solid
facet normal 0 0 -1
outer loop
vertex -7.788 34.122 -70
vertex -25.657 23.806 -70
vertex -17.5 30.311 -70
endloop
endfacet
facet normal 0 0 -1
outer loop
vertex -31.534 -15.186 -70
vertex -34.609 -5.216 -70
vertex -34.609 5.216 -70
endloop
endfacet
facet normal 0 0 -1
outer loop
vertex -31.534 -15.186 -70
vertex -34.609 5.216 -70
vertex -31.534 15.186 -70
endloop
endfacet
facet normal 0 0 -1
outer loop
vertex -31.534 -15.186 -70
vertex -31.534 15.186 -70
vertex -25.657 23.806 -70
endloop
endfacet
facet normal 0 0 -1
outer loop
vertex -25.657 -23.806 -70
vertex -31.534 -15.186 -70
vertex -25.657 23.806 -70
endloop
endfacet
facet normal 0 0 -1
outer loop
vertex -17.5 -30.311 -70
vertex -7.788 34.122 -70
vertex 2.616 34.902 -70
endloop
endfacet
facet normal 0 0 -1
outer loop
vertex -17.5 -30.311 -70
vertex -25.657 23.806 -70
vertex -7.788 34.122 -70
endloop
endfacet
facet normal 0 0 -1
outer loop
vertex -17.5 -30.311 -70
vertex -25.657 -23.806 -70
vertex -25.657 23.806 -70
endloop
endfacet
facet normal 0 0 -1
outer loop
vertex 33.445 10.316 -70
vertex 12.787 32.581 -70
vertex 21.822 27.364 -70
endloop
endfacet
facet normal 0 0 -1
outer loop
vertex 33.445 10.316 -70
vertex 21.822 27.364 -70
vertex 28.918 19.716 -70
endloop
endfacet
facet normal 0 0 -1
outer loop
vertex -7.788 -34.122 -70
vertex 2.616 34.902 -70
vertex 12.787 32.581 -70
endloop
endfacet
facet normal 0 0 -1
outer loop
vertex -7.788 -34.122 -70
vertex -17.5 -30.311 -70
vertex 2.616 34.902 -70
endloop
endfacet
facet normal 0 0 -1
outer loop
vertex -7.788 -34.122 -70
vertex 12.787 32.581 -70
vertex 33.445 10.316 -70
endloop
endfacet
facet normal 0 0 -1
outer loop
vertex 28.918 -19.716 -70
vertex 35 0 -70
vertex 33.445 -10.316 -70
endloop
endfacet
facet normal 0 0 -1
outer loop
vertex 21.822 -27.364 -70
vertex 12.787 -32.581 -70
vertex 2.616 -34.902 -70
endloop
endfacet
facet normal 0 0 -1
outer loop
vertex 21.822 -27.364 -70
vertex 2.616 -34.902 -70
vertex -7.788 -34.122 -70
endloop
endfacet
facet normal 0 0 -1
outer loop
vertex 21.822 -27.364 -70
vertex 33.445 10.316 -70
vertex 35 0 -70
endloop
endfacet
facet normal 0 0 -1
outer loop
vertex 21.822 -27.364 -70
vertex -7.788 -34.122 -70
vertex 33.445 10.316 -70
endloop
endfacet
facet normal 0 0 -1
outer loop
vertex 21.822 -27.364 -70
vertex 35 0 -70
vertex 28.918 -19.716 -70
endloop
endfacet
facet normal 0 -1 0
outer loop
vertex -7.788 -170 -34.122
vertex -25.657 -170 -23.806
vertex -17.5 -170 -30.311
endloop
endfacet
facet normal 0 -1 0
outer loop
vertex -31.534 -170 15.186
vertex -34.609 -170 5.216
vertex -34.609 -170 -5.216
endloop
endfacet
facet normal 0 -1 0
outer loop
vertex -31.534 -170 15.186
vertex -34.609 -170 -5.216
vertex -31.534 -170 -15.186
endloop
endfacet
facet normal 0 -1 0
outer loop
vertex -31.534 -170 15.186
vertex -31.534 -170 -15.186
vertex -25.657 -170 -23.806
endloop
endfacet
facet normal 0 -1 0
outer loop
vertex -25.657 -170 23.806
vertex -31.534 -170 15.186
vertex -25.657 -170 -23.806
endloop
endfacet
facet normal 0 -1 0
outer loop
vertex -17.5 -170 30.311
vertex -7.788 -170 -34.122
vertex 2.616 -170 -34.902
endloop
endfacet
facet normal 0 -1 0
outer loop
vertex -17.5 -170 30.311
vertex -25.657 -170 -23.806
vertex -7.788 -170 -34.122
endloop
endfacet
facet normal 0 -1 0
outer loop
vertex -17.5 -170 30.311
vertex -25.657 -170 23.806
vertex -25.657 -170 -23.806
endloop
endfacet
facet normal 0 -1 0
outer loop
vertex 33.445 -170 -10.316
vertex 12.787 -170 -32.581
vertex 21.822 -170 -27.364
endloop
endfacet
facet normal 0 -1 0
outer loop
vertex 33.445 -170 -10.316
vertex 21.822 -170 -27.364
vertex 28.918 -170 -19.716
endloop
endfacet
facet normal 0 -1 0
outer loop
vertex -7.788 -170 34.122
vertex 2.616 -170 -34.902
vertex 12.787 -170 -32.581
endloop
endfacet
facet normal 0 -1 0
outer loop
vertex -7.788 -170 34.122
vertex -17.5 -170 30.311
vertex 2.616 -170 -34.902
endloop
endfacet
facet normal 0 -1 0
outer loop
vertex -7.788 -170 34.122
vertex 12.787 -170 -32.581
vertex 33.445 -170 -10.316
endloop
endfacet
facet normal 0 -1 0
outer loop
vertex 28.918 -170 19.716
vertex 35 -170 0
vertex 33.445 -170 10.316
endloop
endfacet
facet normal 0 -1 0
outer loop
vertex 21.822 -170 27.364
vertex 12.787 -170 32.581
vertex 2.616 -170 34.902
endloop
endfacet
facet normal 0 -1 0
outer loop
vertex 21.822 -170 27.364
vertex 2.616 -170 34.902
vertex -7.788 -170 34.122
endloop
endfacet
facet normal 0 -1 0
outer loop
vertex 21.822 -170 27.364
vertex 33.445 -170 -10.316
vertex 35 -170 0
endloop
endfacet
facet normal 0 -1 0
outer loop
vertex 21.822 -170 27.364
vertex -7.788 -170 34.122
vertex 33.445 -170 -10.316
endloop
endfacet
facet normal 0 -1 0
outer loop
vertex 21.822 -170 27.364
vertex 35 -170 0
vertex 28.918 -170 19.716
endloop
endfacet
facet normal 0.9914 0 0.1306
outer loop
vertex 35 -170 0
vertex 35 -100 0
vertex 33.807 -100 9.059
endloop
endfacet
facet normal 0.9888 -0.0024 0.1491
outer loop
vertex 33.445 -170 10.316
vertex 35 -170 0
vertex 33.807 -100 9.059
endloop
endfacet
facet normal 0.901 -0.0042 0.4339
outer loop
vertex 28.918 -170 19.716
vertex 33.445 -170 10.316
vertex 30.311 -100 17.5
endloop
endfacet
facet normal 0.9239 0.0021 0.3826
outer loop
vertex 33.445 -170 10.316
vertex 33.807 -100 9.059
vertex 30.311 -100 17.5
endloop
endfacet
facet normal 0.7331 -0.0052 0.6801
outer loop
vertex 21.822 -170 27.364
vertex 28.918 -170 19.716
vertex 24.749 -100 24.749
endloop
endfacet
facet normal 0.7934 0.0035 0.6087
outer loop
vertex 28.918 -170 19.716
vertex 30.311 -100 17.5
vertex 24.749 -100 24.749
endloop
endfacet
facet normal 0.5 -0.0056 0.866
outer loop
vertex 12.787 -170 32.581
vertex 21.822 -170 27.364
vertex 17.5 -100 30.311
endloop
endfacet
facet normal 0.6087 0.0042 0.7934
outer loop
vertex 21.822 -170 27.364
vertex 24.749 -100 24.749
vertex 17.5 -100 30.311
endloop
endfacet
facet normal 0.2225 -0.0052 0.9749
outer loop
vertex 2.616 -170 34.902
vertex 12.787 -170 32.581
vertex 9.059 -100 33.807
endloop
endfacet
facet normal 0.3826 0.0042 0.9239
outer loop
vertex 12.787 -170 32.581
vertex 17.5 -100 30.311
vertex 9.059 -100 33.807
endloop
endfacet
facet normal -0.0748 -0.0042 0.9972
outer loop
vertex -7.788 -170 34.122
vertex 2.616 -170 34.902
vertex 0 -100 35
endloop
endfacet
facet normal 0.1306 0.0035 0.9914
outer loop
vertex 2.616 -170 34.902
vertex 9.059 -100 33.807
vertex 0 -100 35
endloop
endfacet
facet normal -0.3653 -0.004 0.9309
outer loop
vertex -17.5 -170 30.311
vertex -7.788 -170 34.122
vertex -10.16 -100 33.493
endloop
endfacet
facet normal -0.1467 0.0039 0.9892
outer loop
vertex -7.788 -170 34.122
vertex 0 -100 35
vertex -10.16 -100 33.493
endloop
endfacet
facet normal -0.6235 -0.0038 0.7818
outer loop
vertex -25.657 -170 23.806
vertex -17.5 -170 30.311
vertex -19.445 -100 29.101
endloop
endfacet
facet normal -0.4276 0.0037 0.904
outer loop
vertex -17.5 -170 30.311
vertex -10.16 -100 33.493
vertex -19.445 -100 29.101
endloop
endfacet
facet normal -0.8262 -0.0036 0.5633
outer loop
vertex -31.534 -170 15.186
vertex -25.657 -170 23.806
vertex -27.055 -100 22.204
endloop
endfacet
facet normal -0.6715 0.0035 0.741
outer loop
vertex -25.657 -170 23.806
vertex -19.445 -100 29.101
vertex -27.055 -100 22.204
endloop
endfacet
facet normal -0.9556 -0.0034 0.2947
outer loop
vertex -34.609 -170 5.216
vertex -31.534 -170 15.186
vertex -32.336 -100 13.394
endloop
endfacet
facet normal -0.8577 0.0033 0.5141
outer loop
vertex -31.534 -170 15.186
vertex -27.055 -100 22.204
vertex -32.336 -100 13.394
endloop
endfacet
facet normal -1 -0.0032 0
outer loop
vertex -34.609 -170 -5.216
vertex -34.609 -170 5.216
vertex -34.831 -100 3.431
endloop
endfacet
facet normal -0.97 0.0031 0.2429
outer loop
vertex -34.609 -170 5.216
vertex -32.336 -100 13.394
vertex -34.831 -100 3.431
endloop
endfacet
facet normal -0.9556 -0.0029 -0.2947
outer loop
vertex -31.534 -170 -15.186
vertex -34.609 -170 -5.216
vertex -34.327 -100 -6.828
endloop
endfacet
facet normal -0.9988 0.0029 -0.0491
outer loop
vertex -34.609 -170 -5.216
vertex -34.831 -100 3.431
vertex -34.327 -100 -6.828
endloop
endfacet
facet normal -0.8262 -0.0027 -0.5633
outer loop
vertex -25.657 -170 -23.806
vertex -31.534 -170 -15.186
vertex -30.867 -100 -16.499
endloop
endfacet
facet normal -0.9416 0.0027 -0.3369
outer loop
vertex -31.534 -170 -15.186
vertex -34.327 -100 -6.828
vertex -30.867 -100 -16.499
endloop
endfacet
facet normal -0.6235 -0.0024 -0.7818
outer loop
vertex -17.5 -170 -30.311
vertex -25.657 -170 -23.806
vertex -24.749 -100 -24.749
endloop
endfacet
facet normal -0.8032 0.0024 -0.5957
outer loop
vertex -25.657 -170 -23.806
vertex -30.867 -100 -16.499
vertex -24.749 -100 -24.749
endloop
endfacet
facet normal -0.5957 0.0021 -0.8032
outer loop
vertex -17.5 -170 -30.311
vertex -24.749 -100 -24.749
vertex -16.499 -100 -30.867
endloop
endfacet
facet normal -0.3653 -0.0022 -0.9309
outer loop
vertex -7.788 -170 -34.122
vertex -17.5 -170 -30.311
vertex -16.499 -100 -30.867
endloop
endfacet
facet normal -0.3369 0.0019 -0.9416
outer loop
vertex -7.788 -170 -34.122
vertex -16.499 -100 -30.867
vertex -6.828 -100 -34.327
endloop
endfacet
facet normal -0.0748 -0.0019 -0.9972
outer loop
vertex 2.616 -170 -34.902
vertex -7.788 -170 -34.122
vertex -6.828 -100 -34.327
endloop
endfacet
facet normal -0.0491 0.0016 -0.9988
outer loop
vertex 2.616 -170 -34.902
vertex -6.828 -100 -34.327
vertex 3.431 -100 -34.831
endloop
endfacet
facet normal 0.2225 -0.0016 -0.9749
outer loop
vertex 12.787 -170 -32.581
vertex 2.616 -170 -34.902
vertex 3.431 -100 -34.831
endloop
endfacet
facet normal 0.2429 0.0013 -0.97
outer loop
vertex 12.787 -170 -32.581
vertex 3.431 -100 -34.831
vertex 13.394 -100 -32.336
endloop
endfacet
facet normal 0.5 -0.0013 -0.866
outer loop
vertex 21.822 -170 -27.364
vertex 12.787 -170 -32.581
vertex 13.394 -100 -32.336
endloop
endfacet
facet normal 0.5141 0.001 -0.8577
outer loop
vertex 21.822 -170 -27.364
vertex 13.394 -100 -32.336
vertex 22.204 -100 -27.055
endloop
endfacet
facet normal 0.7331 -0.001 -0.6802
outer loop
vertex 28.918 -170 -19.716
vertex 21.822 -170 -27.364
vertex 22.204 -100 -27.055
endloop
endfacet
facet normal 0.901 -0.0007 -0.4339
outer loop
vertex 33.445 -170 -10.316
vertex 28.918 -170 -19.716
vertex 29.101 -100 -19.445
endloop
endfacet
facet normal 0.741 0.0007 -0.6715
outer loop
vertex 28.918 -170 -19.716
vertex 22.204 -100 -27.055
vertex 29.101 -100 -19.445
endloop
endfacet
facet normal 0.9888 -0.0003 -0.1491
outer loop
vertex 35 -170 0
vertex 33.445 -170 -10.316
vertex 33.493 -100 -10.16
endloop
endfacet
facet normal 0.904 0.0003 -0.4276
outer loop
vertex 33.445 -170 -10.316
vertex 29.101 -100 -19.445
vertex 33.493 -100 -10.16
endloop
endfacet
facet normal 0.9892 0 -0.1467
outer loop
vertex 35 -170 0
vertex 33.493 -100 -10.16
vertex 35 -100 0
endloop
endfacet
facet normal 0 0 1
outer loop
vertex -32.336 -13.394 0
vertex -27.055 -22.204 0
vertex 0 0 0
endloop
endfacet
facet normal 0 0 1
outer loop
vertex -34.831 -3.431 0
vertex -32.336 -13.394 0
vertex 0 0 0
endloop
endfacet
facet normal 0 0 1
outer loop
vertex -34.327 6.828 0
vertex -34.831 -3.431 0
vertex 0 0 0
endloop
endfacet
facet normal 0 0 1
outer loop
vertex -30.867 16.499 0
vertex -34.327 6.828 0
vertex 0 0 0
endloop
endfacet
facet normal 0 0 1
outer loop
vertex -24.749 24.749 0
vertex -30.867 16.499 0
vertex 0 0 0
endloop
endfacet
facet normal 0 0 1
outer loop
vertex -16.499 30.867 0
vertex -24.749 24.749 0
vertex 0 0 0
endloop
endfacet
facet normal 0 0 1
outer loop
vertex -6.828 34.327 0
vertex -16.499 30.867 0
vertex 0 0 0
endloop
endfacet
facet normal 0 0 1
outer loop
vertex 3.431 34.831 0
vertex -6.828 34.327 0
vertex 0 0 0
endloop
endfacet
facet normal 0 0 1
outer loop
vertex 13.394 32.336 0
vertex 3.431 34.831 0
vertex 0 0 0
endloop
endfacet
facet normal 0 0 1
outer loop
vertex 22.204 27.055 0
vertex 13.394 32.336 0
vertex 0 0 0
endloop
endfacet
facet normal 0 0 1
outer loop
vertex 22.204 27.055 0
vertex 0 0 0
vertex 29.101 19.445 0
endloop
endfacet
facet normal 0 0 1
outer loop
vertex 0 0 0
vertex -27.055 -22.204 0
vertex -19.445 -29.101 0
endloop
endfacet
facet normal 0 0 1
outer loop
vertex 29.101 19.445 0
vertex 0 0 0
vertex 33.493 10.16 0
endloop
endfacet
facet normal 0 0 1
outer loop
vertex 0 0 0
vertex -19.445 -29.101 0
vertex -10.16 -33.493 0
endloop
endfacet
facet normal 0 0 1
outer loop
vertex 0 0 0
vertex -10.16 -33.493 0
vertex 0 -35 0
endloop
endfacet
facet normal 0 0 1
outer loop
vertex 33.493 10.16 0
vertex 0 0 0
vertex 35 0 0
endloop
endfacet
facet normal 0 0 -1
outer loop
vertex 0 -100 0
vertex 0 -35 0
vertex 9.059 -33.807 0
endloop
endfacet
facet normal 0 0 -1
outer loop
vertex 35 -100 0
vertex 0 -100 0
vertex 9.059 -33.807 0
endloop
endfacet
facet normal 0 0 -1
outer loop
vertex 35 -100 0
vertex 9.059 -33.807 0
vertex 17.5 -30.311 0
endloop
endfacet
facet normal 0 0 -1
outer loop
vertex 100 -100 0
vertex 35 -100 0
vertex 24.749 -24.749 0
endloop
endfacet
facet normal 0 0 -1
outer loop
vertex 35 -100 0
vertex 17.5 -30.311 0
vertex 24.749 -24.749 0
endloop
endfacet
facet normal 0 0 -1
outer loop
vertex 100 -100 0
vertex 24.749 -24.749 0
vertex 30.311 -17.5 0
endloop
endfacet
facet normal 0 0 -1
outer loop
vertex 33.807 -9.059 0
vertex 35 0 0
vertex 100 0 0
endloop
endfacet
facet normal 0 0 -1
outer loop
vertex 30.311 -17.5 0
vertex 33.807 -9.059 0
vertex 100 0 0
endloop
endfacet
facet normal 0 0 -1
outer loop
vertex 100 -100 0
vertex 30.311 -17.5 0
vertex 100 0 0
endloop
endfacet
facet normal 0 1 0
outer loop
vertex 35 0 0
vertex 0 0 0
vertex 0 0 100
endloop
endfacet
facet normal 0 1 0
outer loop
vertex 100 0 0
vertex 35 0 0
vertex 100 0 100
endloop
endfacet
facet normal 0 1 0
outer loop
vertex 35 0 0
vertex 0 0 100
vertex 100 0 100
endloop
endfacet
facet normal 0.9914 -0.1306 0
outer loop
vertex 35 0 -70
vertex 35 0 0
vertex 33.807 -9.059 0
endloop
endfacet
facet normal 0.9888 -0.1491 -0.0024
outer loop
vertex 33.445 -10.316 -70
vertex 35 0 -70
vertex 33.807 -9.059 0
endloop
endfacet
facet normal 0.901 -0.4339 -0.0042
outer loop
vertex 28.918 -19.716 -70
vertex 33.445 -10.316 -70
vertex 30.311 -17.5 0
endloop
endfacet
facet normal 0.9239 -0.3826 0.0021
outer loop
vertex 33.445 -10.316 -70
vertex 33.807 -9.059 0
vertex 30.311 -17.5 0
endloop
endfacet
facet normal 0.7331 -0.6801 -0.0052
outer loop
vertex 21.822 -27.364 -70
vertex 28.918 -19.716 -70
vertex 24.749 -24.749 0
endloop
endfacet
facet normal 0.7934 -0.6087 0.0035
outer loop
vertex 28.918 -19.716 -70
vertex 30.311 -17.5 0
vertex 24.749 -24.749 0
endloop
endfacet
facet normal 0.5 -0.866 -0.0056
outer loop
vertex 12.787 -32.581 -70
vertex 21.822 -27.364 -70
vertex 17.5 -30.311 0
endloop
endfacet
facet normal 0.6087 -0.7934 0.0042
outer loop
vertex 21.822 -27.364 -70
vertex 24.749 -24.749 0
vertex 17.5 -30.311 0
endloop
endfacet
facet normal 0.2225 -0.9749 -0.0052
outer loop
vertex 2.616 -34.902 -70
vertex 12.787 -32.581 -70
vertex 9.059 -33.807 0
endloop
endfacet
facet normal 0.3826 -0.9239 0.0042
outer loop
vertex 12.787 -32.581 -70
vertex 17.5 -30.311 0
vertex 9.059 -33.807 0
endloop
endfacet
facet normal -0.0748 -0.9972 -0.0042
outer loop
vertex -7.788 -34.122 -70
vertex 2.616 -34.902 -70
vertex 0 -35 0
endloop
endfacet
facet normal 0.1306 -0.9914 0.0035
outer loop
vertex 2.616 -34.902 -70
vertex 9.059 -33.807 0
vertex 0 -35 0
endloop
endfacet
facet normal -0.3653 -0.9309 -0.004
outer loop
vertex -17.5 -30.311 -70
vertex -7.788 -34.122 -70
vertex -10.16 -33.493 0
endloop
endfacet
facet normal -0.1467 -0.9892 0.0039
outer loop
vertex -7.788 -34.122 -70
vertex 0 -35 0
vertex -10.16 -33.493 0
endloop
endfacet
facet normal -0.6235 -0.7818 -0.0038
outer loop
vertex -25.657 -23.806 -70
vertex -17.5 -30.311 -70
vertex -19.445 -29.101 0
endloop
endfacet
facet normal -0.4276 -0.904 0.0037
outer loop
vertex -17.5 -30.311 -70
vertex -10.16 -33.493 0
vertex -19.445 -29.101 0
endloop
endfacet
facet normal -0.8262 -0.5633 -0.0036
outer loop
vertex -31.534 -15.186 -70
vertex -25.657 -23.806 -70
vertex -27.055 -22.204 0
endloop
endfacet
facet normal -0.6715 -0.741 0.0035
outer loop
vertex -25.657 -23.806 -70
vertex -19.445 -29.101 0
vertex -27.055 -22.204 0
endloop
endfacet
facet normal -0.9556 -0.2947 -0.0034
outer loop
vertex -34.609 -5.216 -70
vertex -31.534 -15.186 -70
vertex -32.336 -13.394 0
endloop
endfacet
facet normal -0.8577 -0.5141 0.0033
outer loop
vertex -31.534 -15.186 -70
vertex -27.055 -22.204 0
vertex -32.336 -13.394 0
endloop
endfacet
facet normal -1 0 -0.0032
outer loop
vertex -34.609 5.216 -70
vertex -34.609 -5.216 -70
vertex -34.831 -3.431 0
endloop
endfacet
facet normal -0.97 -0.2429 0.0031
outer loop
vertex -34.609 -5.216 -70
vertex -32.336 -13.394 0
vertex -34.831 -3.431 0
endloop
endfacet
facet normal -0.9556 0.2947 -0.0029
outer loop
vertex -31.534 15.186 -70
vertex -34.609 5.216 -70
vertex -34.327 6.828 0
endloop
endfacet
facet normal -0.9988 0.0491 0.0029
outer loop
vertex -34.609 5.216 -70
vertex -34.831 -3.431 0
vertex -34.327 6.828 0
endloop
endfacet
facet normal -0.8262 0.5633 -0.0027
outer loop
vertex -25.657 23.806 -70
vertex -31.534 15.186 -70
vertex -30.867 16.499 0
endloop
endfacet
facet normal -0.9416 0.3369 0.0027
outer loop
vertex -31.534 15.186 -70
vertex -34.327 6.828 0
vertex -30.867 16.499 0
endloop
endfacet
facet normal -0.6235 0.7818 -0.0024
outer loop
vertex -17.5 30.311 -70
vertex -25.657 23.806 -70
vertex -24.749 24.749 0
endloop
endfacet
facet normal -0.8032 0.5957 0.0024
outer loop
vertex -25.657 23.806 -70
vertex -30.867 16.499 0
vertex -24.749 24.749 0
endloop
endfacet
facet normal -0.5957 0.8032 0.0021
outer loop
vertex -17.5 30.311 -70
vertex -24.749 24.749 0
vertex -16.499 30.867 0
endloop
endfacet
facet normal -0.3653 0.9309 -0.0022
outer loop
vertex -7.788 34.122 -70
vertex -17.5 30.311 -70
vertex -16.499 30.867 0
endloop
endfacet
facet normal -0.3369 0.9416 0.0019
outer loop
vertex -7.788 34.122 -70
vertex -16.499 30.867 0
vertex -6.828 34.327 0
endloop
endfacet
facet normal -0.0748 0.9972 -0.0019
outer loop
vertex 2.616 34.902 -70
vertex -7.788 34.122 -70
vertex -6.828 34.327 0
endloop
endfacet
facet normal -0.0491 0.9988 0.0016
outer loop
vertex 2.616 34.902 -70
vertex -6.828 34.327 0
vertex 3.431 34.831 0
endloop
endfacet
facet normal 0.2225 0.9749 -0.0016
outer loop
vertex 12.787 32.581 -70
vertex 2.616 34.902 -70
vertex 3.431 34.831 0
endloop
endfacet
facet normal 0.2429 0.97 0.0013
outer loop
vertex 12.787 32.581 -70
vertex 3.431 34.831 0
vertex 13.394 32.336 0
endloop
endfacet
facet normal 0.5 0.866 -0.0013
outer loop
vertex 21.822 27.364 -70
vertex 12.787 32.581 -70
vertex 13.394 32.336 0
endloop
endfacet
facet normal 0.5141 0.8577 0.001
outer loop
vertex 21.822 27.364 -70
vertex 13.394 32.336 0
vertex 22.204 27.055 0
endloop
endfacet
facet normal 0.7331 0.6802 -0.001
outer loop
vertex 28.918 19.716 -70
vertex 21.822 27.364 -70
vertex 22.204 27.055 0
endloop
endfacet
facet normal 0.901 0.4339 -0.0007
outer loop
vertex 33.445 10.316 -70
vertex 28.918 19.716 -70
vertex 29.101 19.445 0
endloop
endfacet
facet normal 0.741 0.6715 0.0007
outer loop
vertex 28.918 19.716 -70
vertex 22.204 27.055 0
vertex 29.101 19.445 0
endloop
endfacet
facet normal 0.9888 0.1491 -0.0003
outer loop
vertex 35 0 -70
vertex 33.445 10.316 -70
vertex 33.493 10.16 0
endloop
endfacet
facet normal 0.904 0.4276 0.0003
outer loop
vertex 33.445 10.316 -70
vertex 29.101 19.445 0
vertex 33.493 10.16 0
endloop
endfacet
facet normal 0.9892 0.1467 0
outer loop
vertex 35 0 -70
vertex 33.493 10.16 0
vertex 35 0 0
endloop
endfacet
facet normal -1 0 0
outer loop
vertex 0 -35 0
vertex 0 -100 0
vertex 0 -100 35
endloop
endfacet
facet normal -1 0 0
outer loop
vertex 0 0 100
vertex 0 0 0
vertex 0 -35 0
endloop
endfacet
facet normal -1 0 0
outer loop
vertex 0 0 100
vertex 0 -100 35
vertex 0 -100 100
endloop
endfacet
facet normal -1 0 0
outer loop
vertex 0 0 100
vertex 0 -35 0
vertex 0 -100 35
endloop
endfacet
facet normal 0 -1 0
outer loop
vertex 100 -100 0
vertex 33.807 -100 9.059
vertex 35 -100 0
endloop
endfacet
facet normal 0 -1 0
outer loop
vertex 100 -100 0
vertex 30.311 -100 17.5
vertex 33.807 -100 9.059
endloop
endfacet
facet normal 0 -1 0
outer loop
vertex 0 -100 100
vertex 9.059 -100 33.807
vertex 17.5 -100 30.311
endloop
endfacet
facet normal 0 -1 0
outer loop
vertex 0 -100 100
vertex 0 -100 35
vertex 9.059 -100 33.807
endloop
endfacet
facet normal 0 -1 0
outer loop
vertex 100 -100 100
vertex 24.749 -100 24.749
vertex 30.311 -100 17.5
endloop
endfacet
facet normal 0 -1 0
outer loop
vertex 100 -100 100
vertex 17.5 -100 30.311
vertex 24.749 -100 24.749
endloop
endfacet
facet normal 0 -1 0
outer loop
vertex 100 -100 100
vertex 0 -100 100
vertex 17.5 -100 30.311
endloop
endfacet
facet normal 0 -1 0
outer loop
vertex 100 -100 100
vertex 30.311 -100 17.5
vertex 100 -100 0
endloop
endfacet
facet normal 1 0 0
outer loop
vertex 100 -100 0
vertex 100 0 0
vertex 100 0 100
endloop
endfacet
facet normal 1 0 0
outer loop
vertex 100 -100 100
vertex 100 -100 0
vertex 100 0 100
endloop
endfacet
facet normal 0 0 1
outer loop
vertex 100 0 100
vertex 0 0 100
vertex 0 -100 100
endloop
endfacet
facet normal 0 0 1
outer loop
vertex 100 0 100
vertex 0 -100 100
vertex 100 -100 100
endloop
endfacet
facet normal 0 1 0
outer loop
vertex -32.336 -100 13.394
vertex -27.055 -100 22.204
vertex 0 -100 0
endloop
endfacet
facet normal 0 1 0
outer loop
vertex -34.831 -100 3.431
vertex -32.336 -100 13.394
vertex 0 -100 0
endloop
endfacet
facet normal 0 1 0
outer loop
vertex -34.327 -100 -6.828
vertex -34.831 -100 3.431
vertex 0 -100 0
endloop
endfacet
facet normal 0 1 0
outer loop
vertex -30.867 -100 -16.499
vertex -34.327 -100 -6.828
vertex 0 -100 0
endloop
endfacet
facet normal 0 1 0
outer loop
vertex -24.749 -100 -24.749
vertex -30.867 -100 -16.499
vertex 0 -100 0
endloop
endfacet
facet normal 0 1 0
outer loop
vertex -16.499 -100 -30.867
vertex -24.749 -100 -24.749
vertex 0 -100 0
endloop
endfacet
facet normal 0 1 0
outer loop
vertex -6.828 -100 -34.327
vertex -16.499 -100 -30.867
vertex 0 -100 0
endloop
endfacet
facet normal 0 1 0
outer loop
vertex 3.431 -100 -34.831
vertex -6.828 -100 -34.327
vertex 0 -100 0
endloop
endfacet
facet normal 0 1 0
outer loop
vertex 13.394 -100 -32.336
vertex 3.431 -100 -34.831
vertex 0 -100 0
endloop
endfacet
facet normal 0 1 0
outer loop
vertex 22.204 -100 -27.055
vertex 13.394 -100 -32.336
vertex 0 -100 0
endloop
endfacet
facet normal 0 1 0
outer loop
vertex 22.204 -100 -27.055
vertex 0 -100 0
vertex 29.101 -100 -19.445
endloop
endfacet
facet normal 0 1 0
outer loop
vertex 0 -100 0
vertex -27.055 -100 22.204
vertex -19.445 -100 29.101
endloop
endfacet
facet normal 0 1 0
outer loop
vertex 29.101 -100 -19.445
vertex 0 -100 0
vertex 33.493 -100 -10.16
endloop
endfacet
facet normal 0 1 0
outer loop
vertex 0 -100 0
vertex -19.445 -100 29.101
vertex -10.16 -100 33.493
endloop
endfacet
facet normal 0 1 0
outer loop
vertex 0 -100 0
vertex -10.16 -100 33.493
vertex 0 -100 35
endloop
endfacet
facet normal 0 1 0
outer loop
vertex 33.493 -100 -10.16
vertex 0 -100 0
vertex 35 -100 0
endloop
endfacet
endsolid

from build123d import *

# Parameters (mm, degrees)
F0_W     = 100
F0_H     = 100
F1_DEPTH = 100
F2_R     = 35
F3_DEPTH = 70
F4_R     = 35
F5_DEPTH = 70


with BuildPart() as f1:
    # F0 (on Front) → F1 (new body)
    with BuildSketch(Plane.XZ):
        with Locations((50, 50)):
            Rectangle(F0_W, F0_H)
    extrude(amount=F1_DEPTH)

    # F2 (on face) → F3 (join)
    with BuildSketch(Plane(origin=(0, 0, 0), x_dir=(1, 0, 0), z_dir=(0, 0, -1))):
        Circle(F2_R)
    extrude(amount=F3_DEPTH)

    # F4 (on face) → F5 (join)
    with BuildSketch(Plane.XZ.offset(100)):
        Circle(F4_R)
    extrude(amount=F5_DEPTH)


solid = f1.part
